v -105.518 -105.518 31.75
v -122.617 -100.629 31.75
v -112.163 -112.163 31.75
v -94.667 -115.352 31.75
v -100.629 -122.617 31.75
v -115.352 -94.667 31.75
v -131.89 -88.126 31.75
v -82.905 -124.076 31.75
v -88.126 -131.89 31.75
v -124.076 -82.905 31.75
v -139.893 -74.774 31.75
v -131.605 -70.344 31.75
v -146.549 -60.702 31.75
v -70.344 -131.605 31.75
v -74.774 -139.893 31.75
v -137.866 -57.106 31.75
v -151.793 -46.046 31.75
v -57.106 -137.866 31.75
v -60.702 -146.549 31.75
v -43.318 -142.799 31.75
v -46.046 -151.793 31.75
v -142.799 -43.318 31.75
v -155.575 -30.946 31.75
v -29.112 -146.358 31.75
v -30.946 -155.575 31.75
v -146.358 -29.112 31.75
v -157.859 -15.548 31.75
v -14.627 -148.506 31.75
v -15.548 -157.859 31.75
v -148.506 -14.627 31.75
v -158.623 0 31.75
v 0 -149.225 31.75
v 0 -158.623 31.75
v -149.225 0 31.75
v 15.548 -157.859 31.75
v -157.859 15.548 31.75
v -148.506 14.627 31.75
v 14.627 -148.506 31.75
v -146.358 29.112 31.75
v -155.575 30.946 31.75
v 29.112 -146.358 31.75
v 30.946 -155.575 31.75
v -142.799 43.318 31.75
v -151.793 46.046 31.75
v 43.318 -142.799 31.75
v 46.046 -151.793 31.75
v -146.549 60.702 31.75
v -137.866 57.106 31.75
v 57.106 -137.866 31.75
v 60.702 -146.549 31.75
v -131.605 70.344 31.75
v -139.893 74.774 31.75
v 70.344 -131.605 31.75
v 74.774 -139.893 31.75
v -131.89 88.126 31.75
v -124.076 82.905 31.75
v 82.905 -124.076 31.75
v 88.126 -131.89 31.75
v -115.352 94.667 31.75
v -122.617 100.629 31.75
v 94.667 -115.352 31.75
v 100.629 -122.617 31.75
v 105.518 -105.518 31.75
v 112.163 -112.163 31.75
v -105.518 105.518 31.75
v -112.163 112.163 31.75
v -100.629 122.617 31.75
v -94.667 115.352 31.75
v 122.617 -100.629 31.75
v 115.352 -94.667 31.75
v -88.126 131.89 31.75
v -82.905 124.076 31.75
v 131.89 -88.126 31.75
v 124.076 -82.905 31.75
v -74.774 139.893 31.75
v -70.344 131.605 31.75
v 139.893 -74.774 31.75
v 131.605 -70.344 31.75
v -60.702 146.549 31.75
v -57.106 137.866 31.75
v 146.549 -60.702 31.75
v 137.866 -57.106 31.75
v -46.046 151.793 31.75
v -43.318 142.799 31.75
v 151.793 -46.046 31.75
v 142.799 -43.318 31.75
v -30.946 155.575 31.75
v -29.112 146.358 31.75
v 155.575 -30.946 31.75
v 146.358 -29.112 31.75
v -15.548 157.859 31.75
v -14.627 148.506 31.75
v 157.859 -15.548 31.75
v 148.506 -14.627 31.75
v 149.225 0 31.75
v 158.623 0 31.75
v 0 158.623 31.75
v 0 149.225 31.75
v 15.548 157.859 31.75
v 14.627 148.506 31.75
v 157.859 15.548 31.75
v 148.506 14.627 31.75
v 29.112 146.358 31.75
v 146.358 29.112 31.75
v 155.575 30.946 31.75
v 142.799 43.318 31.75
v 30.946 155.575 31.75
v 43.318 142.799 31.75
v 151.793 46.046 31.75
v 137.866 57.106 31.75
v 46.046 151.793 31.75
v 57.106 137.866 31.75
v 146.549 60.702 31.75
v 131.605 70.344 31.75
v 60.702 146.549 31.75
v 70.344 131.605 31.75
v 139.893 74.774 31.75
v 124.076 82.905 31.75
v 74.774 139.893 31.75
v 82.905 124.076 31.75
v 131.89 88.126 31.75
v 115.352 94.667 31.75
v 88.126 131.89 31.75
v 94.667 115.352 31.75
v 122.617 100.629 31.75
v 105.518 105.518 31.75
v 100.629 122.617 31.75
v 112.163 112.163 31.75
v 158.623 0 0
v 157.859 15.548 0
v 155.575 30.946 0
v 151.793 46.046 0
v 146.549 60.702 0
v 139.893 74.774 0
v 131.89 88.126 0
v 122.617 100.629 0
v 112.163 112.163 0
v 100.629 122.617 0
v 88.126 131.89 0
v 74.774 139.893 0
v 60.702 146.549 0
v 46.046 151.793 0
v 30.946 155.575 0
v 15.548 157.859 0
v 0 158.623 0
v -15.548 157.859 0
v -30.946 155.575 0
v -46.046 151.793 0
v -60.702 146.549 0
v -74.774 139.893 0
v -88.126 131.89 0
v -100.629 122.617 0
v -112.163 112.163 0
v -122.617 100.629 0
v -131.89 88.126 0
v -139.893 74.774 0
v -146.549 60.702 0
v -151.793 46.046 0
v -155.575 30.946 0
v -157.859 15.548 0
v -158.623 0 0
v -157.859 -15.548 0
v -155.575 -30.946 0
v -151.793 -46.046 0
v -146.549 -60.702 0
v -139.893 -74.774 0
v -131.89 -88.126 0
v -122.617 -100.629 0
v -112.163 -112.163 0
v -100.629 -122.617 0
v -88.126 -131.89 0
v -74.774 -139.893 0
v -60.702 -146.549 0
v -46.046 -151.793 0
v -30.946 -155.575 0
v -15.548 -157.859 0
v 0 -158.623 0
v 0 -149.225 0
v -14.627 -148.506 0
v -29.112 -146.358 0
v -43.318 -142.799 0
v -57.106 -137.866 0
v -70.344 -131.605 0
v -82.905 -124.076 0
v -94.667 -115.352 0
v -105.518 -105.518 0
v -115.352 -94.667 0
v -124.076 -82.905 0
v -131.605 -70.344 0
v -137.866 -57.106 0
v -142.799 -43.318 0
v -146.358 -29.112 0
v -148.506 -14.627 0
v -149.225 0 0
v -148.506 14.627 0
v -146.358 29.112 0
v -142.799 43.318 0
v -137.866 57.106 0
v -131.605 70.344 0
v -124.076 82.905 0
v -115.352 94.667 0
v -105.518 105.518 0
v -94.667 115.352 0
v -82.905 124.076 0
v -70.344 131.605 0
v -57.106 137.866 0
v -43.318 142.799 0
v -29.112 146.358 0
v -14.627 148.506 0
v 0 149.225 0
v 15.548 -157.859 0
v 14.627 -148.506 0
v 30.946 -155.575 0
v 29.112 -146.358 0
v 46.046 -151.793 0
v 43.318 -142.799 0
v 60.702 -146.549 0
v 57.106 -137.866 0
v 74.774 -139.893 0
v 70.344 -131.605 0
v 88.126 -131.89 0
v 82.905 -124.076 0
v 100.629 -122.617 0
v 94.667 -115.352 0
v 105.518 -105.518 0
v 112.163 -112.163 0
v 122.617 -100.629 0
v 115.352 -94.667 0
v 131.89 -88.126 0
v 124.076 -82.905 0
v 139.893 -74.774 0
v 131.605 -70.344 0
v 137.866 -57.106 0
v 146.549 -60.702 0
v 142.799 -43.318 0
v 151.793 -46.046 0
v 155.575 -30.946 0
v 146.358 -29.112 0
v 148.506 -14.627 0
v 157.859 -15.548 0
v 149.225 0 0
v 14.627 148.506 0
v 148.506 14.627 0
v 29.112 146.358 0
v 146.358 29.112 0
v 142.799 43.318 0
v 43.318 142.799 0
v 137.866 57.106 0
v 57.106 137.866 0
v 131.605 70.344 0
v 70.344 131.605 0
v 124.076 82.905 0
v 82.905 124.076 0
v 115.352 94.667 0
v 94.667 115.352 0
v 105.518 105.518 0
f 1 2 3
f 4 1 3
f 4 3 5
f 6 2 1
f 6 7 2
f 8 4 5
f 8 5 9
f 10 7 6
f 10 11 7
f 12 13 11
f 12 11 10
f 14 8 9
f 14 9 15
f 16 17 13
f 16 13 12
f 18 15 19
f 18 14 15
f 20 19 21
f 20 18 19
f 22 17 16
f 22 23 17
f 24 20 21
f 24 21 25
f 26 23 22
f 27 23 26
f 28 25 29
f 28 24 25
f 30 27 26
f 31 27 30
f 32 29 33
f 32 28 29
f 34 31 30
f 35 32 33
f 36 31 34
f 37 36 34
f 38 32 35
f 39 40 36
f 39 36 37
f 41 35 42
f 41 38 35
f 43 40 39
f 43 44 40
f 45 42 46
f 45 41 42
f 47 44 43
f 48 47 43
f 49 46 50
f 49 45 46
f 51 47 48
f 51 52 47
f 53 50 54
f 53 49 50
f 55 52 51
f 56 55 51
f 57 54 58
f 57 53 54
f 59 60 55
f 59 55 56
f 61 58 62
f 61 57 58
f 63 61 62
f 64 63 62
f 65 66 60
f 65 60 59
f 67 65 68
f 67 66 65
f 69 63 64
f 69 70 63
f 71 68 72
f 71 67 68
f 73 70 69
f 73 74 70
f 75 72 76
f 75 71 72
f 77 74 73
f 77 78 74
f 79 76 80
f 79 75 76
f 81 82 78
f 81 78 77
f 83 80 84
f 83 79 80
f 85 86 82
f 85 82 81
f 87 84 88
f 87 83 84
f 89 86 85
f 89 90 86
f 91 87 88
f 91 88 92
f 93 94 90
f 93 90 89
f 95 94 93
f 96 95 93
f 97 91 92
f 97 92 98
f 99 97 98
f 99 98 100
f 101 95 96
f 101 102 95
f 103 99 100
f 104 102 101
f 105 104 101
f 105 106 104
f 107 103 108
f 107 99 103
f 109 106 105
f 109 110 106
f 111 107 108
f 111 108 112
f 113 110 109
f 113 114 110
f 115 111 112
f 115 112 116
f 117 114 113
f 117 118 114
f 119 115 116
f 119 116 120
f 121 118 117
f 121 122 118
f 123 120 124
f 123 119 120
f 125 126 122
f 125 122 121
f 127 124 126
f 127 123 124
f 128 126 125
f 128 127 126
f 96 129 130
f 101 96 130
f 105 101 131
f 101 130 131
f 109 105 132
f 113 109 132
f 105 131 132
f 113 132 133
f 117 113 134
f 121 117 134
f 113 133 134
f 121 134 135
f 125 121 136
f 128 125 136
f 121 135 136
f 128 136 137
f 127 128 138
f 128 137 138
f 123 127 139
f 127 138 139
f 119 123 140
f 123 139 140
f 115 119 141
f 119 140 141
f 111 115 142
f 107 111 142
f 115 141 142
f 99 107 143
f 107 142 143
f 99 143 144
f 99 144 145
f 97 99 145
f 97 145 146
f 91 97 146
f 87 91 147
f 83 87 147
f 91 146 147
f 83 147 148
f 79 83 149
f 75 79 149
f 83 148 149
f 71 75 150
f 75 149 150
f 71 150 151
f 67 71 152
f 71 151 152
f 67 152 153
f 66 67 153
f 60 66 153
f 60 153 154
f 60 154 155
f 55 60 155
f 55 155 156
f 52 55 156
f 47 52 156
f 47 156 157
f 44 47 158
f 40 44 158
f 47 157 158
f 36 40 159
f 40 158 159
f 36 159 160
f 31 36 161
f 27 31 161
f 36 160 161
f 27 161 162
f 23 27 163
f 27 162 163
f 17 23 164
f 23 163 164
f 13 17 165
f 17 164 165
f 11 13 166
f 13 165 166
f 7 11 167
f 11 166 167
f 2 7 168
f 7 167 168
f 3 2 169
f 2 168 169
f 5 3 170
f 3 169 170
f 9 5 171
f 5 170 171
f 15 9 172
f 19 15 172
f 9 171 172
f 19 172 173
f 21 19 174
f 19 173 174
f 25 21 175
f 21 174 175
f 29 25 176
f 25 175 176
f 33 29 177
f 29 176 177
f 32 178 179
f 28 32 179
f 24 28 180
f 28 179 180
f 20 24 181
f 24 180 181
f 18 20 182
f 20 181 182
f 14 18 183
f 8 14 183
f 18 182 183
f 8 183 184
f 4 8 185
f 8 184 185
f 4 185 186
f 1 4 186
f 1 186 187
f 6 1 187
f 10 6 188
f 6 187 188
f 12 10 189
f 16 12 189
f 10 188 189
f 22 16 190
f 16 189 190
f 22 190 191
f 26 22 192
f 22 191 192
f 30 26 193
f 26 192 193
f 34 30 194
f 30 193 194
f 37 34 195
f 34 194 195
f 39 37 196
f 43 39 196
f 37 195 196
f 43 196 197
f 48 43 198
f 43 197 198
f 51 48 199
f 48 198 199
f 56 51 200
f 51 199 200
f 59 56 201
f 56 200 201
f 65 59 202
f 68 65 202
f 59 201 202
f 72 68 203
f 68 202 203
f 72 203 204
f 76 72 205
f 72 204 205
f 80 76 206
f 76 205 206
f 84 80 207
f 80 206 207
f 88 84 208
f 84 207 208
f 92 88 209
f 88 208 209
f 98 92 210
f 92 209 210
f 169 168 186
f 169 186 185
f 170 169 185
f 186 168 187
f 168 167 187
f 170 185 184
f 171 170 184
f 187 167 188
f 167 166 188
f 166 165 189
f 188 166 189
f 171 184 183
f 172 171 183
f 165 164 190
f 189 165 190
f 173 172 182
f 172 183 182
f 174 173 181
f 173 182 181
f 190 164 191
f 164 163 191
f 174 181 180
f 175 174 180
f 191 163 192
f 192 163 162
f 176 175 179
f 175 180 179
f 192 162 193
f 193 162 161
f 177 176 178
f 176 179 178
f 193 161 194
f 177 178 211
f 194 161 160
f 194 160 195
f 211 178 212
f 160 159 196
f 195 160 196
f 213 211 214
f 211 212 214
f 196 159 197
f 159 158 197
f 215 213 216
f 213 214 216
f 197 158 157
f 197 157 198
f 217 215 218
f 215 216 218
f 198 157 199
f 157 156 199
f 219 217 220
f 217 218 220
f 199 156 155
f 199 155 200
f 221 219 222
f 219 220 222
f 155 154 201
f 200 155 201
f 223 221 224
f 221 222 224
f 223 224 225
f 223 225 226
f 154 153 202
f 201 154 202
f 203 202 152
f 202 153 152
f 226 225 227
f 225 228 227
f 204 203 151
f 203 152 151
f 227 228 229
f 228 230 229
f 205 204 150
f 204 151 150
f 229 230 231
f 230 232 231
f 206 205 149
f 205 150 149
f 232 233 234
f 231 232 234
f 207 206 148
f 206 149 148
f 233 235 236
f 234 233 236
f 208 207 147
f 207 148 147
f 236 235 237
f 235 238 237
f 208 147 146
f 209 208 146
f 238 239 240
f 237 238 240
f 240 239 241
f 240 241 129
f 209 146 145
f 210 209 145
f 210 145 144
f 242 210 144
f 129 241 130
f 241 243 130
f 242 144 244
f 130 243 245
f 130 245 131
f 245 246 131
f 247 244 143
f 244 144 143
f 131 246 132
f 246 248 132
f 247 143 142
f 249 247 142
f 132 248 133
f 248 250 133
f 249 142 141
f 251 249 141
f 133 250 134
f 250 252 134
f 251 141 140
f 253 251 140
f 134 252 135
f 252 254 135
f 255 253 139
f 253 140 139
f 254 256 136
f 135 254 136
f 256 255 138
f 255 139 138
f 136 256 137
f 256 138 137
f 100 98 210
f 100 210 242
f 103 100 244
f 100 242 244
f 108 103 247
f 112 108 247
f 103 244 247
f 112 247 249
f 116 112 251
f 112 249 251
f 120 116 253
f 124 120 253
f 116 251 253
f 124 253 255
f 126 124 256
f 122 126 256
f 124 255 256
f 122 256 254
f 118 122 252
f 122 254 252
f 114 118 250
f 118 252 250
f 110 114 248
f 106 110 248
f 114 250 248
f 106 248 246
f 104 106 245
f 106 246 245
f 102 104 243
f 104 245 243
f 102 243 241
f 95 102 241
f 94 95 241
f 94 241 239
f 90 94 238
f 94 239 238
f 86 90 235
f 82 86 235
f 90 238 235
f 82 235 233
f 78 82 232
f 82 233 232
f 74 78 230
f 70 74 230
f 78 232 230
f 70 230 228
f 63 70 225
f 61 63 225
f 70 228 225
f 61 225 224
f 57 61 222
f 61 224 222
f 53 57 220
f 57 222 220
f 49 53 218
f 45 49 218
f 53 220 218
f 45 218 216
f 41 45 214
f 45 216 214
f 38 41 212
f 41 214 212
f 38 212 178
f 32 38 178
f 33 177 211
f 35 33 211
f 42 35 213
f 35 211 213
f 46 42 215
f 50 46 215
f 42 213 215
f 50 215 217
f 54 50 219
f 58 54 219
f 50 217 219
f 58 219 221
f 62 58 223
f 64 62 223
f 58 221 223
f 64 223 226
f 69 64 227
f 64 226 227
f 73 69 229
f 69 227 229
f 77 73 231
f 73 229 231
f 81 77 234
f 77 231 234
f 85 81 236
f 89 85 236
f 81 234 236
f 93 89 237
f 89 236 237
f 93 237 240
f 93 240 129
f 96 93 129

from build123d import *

# Parameters (mm, degrees)
F1_DEPTH = 31.75


with BuildPart() as f1:
    # F0 (on Top) → F1 (new body)
    with BuildSketch(Plane.XY):
        with BuildLine():
            ThreePointArc((0, -158.623), (112.163399, -112.163399), (158.623, 0))
            ThreePointArc((158.623, 0), (112.163399, 112.163399), (0, 158.623))
            Line((0, 158.623), (0, 149.225))
            ThreePointArc((0, 149.225), (105.518009, 105.518009), (149.225, 0))
            ThreePointArc((149.225, 0), (105.518009, -105.518009), (0, -149.225))
            Line((0, -149.225), (0, -158.623))
        make_face()
        with BuildLine():
            Line((0, 149.225), (0, 158.623))
            ThreePointArc((0, 158.623), (-158.623, 0), (0, -158.623))
            Line((0, -158.623), (0, -149.225))
            ThreePointArc((0, -149.225), (-149.225, 0), (0, 149.225))
        make_face()
    extrude(amount=F1_DEPTH)


solid = f1.part
